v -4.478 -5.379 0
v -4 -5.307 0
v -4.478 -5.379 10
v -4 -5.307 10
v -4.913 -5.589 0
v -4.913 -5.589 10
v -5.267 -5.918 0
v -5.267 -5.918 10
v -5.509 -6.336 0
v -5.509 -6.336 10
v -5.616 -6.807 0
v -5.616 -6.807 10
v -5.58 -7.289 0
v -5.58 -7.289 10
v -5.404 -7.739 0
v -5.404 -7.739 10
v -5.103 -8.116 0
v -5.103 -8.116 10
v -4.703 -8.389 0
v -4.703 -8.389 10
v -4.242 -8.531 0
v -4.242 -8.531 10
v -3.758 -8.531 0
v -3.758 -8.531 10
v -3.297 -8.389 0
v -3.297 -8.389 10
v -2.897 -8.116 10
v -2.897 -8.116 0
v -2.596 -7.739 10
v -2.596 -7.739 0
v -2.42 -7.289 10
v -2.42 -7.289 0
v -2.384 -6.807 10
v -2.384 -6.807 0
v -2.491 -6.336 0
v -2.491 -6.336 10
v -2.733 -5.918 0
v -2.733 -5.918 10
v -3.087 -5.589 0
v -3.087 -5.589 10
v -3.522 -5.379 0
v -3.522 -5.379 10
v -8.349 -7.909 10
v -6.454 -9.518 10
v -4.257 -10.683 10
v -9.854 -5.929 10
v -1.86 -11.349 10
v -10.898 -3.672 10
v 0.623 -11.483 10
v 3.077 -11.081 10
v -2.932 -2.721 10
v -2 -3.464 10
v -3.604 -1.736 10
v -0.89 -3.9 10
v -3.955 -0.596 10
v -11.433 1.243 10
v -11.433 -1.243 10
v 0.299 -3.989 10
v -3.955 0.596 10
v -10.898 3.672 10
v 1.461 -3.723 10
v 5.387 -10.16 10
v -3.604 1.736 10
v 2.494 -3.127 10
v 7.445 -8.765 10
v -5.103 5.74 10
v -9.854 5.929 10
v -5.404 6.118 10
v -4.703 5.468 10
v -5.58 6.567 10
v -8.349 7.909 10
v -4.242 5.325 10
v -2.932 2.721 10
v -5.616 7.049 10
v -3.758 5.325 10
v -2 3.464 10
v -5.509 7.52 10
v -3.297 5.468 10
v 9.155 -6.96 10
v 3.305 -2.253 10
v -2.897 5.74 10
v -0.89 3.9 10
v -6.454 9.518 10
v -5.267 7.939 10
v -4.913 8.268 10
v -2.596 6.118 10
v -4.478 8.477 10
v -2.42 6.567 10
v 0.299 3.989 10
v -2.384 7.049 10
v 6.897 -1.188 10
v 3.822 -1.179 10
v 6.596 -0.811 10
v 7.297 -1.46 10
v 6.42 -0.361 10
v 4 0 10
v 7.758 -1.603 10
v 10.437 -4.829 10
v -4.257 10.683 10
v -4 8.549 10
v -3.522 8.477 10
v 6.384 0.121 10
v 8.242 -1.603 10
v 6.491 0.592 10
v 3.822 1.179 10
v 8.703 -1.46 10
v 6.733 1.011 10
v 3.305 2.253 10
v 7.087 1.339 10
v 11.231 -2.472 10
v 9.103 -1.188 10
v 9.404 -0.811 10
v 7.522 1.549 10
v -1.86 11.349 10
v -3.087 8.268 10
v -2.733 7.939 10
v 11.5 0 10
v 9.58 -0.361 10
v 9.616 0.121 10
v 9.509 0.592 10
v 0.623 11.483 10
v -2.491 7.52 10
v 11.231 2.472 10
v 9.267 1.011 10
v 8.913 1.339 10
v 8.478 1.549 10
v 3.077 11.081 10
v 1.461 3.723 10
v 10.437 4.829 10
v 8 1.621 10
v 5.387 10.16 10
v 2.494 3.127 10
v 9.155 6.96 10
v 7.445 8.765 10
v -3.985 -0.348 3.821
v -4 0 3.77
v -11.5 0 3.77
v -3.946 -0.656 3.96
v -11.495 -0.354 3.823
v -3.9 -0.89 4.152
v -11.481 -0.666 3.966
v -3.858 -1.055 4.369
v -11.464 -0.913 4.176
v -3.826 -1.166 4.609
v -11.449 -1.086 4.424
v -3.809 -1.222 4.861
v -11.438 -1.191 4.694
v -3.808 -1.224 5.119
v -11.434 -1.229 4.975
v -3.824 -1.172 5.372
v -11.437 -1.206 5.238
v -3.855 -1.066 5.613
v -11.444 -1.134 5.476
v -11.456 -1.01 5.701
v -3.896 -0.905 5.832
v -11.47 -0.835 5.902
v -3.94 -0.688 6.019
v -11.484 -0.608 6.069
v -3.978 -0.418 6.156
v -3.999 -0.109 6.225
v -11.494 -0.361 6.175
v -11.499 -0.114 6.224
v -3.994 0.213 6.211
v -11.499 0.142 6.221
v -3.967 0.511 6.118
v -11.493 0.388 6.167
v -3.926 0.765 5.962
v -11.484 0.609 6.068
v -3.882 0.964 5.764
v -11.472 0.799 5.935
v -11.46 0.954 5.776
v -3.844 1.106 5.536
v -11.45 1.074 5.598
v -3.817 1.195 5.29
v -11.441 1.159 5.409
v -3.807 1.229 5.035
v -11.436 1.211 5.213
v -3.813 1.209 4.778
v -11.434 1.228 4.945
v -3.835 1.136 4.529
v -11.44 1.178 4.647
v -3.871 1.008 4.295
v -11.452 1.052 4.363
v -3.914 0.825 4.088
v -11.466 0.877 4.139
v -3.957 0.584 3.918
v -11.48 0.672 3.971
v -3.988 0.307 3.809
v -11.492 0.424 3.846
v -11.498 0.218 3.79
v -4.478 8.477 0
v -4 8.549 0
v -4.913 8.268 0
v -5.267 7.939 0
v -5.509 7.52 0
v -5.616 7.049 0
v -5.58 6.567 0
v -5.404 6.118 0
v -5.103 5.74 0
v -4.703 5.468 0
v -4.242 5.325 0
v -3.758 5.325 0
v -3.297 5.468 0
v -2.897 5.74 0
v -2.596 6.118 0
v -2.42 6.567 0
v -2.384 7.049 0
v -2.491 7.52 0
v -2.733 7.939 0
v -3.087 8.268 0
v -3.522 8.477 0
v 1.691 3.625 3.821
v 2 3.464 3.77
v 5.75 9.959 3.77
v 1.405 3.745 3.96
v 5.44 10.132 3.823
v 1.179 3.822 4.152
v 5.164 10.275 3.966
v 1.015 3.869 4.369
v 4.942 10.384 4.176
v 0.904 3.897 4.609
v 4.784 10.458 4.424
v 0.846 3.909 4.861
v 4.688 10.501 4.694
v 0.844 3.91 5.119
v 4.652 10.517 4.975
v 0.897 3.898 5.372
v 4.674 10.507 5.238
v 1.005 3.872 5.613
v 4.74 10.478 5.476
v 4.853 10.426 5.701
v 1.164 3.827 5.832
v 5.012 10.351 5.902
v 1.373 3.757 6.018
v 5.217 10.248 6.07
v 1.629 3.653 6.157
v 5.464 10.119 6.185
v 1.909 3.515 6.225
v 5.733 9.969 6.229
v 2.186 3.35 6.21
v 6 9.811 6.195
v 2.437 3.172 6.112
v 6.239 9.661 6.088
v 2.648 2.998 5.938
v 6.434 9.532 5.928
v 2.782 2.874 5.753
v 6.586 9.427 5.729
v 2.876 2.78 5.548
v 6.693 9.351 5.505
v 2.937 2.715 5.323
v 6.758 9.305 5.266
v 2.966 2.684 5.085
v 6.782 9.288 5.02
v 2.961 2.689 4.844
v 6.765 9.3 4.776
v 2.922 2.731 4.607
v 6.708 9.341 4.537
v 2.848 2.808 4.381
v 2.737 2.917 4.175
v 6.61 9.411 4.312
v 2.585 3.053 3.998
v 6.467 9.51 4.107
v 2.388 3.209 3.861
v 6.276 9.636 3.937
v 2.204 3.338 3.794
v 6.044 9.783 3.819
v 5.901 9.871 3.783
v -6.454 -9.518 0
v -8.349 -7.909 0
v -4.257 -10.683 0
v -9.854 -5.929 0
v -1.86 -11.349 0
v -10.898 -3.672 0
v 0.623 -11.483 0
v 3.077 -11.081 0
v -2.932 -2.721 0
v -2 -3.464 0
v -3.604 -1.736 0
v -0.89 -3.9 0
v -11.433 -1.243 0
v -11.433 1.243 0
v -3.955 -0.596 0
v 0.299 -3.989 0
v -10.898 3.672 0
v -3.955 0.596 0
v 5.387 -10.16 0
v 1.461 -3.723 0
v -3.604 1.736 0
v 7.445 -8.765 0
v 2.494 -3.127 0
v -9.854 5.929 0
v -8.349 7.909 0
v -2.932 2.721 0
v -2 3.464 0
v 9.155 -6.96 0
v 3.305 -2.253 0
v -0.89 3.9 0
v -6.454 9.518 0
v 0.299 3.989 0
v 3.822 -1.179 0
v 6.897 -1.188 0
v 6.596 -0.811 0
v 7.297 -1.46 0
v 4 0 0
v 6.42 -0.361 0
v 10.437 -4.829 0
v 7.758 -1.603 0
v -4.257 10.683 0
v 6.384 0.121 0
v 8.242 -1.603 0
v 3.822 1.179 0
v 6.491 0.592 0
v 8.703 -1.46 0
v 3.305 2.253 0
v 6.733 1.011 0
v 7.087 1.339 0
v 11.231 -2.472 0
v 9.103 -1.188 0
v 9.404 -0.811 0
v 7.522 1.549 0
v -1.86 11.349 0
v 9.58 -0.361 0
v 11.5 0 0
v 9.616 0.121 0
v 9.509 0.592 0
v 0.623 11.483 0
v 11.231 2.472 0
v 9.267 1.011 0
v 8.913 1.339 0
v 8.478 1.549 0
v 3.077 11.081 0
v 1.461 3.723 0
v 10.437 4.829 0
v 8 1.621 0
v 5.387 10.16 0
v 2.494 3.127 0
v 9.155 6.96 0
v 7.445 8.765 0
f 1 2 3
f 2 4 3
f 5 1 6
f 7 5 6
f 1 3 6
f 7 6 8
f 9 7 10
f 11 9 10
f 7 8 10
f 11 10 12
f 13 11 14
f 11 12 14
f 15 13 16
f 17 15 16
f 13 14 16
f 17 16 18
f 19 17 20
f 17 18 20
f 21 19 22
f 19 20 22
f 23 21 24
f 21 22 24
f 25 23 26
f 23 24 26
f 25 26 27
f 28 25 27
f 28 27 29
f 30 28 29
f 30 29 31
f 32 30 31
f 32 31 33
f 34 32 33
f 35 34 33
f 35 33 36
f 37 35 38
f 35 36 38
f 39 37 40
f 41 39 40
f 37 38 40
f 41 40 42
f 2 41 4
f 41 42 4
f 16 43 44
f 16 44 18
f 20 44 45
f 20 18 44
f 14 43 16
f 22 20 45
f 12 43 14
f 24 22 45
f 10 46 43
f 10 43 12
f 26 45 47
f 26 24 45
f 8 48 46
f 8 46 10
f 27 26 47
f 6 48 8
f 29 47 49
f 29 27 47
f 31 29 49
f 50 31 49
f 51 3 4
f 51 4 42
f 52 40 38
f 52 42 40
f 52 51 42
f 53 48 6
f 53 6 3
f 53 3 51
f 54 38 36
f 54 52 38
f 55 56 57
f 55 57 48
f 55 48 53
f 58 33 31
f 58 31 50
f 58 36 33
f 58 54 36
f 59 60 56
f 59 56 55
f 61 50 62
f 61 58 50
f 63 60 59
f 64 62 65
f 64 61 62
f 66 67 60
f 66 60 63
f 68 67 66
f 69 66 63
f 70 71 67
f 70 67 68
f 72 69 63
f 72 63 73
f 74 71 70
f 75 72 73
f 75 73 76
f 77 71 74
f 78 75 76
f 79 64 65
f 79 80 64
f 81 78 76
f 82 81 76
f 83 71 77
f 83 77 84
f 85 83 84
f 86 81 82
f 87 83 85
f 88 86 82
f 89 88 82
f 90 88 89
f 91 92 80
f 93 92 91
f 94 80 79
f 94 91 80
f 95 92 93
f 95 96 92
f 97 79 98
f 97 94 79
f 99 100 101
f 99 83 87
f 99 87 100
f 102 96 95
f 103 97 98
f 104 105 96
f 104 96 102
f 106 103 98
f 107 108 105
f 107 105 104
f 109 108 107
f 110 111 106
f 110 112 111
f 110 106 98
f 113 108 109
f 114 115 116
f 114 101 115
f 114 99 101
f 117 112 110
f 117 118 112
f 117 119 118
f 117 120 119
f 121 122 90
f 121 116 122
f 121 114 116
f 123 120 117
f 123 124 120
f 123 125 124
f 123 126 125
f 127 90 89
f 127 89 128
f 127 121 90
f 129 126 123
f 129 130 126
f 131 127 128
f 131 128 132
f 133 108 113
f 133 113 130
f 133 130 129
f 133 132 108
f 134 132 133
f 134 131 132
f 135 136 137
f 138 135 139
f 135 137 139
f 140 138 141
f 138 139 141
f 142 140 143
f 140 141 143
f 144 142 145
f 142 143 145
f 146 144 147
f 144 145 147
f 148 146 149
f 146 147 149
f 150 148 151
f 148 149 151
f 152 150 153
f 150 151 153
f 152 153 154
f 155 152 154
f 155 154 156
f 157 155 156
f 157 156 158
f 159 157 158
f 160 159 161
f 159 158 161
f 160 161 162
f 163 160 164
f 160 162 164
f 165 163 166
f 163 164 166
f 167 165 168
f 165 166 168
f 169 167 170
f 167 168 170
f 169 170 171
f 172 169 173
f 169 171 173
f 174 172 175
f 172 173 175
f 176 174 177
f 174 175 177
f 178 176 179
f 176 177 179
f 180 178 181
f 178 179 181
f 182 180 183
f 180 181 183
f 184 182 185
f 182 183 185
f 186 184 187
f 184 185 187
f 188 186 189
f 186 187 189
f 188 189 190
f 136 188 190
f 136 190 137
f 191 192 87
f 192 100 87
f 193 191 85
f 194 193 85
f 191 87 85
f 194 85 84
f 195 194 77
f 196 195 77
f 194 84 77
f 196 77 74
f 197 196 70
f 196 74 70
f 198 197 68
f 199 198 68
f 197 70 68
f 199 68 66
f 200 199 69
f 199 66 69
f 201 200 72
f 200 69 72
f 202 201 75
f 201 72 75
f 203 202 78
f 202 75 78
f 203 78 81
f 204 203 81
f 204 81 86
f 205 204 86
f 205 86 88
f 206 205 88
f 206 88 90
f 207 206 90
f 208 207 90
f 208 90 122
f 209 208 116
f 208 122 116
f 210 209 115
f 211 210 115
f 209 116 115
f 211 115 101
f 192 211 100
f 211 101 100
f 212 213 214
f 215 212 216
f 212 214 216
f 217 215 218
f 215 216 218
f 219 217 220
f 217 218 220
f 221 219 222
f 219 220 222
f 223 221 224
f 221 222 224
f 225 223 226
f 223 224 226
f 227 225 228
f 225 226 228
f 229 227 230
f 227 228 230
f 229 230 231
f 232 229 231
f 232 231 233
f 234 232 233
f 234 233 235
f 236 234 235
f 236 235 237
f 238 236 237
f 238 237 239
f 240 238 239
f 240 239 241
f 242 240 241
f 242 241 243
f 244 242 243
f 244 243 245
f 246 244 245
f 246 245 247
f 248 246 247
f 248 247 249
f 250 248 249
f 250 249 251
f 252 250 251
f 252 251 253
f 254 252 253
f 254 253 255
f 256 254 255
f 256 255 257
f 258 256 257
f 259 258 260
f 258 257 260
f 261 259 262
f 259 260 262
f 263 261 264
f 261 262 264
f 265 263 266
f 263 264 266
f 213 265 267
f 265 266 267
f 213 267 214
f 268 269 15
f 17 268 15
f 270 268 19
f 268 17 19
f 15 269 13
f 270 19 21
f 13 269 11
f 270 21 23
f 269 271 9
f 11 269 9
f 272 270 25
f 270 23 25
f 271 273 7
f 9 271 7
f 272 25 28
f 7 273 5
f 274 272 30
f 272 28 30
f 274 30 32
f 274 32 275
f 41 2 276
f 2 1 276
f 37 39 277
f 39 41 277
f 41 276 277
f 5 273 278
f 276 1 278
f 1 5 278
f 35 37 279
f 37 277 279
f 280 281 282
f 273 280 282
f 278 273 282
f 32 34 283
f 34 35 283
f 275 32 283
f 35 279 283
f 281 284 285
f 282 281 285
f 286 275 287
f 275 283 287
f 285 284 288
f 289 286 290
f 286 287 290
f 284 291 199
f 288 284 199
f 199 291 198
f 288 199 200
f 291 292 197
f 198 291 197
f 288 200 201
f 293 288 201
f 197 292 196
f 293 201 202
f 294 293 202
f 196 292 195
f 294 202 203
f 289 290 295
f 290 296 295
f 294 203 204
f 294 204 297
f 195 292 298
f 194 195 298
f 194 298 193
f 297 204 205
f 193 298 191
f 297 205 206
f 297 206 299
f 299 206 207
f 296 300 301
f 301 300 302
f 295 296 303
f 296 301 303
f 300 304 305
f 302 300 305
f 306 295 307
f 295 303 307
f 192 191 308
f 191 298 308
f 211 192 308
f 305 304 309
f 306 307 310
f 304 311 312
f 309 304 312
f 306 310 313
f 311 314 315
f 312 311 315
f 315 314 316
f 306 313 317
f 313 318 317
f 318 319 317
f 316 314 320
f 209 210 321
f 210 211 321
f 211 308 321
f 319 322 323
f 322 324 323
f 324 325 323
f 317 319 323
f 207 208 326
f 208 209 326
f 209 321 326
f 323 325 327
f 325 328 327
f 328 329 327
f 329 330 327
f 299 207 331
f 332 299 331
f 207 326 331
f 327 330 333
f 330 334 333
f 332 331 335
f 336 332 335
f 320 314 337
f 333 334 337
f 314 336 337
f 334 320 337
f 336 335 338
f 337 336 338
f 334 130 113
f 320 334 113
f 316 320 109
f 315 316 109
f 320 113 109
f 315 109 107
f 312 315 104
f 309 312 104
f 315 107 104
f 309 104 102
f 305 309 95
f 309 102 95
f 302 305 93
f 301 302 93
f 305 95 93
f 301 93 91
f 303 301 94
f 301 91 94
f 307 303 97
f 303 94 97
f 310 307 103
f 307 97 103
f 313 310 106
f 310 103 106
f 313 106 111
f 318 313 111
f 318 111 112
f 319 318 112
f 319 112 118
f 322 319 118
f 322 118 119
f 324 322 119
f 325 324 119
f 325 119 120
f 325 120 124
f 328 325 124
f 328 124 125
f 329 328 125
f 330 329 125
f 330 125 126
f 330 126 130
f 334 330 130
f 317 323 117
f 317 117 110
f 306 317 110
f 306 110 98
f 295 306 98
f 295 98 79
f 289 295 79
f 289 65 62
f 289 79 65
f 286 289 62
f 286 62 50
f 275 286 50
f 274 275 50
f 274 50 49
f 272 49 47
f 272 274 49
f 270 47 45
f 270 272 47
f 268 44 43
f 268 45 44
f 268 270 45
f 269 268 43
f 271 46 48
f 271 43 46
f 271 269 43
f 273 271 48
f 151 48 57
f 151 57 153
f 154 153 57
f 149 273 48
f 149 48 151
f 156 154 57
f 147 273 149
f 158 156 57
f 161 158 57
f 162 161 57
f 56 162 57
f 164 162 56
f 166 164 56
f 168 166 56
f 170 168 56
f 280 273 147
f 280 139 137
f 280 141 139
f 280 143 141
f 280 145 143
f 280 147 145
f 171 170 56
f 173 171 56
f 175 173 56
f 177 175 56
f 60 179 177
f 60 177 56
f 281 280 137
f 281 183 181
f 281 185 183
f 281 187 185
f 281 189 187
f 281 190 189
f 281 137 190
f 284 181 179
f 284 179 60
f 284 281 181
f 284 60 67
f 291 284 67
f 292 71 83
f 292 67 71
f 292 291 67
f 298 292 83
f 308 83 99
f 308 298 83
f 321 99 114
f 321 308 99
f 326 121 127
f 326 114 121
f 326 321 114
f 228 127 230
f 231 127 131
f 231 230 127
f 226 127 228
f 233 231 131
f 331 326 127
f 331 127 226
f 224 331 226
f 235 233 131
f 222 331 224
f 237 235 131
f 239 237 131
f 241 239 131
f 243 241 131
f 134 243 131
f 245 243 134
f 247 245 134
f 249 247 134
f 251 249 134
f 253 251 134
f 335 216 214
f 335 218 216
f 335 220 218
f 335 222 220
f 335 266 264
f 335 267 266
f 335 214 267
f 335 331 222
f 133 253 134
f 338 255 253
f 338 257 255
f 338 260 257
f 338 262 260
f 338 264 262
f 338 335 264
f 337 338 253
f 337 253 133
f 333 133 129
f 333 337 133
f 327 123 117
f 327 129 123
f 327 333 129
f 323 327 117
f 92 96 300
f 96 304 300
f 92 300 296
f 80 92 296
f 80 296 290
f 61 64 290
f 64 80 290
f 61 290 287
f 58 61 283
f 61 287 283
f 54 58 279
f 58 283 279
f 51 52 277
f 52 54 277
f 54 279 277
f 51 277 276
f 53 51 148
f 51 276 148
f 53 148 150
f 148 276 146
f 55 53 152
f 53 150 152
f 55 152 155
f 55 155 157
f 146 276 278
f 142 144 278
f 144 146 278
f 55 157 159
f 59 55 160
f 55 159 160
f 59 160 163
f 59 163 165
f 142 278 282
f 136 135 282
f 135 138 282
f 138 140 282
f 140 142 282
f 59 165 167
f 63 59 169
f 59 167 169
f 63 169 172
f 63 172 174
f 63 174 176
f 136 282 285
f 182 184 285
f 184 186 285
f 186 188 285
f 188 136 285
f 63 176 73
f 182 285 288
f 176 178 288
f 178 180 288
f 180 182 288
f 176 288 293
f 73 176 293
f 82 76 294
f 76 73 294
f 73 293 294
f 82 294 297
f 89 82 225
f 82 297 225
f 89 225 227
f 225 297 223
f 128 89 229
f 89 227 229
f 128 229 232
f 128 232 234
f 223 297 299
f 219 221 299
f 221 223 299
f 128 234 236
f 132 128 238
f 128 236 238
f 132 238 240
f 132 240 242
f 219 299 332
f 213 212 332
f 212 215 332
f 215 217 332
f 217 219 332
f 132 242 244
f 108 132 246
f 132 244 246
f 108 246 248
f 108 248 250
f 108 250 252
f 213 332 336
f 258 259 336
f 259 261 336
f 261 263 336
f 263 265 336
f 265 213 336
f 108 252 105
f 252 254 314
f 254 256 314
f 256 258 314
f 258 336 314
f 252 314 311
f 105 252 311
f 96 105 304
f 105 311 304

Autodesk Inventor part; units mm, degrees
ref_plane "YZ Plane" through (0, 0, 0) normal (1, 0, 0) x (0, 1, 0)
ref_plane "XY Plane" through (0, 0, 0) normal (0, 0, 1) x (1, 0, 0)
sketch "Sketch1" plane through (0, 0, 0) normal (0, 0, 1) x (1, 0, 0)
  circle A0 centre (0, 0) radius 11.5
  circle A1 centre (0, 0) radius 4
  point P0 (8, 0)
  point P1 (-4, 6.9282)
  point P2 (-4, -6.9282)
  dimension "d0" = 23
  dimension "d1" = 8
  dimension "d2" = 8
  dimension "d5" = 360
extrude "Plate1" add sketch "Sketch1" along normal blind 10
hole "Hole1" at (8, 0, 0) at (-4, 6.9282, 0) at (-4, -6.9282, 0) direction (0, 0, 1) diameter 3.242 depth 15 tip angle 118 thread size "M4x0.7" class "6H" standard "ISO Metric profile"
sketch "Sketch2" plane through (0, 0, 0) normal (1, 0, 0) x (0, 1, 0)
  line L0 (4, 0) -> (-4, 0) projected
  point P0 (0, 0)
  point P1 (0, 5)
  dimension "d15" = 5
hole "Hole2" at (0, 0, 5) direction (-1, 0, 0) diameter 2.459 end through all thread size "M3x0.5" class "6H" standard "ISO Metric profile"
ref_plane "Work Plane1" through (0, 0, 0) normal (-0.5, -0.866, 0) x (0, 0, 1)
sketch "Sketch3" plane through (0, 0, 0) normal (-0.5, -0.866, 0) x (0, 0, 1)
  point P0 (0, 0)
  point P1 (5, 3.9111)
  point P2 (5, 0)
  dimension "d24" = 5
hole "Hole3" at (0, 0, 5) direction (0.5, 0.866, 0) diameter 2.459 end through all thread size "M3x0.5" class "6H" standard "ISO Metric profile"
equation "\"d7\" = Thickness"
equation "\"BendReliefDepth\" = 0.5 * Thickness"
equation "\"Thickness\" = 10"
properties part number "as mount 10 mm (3x)" material "Aluminum 6061"
